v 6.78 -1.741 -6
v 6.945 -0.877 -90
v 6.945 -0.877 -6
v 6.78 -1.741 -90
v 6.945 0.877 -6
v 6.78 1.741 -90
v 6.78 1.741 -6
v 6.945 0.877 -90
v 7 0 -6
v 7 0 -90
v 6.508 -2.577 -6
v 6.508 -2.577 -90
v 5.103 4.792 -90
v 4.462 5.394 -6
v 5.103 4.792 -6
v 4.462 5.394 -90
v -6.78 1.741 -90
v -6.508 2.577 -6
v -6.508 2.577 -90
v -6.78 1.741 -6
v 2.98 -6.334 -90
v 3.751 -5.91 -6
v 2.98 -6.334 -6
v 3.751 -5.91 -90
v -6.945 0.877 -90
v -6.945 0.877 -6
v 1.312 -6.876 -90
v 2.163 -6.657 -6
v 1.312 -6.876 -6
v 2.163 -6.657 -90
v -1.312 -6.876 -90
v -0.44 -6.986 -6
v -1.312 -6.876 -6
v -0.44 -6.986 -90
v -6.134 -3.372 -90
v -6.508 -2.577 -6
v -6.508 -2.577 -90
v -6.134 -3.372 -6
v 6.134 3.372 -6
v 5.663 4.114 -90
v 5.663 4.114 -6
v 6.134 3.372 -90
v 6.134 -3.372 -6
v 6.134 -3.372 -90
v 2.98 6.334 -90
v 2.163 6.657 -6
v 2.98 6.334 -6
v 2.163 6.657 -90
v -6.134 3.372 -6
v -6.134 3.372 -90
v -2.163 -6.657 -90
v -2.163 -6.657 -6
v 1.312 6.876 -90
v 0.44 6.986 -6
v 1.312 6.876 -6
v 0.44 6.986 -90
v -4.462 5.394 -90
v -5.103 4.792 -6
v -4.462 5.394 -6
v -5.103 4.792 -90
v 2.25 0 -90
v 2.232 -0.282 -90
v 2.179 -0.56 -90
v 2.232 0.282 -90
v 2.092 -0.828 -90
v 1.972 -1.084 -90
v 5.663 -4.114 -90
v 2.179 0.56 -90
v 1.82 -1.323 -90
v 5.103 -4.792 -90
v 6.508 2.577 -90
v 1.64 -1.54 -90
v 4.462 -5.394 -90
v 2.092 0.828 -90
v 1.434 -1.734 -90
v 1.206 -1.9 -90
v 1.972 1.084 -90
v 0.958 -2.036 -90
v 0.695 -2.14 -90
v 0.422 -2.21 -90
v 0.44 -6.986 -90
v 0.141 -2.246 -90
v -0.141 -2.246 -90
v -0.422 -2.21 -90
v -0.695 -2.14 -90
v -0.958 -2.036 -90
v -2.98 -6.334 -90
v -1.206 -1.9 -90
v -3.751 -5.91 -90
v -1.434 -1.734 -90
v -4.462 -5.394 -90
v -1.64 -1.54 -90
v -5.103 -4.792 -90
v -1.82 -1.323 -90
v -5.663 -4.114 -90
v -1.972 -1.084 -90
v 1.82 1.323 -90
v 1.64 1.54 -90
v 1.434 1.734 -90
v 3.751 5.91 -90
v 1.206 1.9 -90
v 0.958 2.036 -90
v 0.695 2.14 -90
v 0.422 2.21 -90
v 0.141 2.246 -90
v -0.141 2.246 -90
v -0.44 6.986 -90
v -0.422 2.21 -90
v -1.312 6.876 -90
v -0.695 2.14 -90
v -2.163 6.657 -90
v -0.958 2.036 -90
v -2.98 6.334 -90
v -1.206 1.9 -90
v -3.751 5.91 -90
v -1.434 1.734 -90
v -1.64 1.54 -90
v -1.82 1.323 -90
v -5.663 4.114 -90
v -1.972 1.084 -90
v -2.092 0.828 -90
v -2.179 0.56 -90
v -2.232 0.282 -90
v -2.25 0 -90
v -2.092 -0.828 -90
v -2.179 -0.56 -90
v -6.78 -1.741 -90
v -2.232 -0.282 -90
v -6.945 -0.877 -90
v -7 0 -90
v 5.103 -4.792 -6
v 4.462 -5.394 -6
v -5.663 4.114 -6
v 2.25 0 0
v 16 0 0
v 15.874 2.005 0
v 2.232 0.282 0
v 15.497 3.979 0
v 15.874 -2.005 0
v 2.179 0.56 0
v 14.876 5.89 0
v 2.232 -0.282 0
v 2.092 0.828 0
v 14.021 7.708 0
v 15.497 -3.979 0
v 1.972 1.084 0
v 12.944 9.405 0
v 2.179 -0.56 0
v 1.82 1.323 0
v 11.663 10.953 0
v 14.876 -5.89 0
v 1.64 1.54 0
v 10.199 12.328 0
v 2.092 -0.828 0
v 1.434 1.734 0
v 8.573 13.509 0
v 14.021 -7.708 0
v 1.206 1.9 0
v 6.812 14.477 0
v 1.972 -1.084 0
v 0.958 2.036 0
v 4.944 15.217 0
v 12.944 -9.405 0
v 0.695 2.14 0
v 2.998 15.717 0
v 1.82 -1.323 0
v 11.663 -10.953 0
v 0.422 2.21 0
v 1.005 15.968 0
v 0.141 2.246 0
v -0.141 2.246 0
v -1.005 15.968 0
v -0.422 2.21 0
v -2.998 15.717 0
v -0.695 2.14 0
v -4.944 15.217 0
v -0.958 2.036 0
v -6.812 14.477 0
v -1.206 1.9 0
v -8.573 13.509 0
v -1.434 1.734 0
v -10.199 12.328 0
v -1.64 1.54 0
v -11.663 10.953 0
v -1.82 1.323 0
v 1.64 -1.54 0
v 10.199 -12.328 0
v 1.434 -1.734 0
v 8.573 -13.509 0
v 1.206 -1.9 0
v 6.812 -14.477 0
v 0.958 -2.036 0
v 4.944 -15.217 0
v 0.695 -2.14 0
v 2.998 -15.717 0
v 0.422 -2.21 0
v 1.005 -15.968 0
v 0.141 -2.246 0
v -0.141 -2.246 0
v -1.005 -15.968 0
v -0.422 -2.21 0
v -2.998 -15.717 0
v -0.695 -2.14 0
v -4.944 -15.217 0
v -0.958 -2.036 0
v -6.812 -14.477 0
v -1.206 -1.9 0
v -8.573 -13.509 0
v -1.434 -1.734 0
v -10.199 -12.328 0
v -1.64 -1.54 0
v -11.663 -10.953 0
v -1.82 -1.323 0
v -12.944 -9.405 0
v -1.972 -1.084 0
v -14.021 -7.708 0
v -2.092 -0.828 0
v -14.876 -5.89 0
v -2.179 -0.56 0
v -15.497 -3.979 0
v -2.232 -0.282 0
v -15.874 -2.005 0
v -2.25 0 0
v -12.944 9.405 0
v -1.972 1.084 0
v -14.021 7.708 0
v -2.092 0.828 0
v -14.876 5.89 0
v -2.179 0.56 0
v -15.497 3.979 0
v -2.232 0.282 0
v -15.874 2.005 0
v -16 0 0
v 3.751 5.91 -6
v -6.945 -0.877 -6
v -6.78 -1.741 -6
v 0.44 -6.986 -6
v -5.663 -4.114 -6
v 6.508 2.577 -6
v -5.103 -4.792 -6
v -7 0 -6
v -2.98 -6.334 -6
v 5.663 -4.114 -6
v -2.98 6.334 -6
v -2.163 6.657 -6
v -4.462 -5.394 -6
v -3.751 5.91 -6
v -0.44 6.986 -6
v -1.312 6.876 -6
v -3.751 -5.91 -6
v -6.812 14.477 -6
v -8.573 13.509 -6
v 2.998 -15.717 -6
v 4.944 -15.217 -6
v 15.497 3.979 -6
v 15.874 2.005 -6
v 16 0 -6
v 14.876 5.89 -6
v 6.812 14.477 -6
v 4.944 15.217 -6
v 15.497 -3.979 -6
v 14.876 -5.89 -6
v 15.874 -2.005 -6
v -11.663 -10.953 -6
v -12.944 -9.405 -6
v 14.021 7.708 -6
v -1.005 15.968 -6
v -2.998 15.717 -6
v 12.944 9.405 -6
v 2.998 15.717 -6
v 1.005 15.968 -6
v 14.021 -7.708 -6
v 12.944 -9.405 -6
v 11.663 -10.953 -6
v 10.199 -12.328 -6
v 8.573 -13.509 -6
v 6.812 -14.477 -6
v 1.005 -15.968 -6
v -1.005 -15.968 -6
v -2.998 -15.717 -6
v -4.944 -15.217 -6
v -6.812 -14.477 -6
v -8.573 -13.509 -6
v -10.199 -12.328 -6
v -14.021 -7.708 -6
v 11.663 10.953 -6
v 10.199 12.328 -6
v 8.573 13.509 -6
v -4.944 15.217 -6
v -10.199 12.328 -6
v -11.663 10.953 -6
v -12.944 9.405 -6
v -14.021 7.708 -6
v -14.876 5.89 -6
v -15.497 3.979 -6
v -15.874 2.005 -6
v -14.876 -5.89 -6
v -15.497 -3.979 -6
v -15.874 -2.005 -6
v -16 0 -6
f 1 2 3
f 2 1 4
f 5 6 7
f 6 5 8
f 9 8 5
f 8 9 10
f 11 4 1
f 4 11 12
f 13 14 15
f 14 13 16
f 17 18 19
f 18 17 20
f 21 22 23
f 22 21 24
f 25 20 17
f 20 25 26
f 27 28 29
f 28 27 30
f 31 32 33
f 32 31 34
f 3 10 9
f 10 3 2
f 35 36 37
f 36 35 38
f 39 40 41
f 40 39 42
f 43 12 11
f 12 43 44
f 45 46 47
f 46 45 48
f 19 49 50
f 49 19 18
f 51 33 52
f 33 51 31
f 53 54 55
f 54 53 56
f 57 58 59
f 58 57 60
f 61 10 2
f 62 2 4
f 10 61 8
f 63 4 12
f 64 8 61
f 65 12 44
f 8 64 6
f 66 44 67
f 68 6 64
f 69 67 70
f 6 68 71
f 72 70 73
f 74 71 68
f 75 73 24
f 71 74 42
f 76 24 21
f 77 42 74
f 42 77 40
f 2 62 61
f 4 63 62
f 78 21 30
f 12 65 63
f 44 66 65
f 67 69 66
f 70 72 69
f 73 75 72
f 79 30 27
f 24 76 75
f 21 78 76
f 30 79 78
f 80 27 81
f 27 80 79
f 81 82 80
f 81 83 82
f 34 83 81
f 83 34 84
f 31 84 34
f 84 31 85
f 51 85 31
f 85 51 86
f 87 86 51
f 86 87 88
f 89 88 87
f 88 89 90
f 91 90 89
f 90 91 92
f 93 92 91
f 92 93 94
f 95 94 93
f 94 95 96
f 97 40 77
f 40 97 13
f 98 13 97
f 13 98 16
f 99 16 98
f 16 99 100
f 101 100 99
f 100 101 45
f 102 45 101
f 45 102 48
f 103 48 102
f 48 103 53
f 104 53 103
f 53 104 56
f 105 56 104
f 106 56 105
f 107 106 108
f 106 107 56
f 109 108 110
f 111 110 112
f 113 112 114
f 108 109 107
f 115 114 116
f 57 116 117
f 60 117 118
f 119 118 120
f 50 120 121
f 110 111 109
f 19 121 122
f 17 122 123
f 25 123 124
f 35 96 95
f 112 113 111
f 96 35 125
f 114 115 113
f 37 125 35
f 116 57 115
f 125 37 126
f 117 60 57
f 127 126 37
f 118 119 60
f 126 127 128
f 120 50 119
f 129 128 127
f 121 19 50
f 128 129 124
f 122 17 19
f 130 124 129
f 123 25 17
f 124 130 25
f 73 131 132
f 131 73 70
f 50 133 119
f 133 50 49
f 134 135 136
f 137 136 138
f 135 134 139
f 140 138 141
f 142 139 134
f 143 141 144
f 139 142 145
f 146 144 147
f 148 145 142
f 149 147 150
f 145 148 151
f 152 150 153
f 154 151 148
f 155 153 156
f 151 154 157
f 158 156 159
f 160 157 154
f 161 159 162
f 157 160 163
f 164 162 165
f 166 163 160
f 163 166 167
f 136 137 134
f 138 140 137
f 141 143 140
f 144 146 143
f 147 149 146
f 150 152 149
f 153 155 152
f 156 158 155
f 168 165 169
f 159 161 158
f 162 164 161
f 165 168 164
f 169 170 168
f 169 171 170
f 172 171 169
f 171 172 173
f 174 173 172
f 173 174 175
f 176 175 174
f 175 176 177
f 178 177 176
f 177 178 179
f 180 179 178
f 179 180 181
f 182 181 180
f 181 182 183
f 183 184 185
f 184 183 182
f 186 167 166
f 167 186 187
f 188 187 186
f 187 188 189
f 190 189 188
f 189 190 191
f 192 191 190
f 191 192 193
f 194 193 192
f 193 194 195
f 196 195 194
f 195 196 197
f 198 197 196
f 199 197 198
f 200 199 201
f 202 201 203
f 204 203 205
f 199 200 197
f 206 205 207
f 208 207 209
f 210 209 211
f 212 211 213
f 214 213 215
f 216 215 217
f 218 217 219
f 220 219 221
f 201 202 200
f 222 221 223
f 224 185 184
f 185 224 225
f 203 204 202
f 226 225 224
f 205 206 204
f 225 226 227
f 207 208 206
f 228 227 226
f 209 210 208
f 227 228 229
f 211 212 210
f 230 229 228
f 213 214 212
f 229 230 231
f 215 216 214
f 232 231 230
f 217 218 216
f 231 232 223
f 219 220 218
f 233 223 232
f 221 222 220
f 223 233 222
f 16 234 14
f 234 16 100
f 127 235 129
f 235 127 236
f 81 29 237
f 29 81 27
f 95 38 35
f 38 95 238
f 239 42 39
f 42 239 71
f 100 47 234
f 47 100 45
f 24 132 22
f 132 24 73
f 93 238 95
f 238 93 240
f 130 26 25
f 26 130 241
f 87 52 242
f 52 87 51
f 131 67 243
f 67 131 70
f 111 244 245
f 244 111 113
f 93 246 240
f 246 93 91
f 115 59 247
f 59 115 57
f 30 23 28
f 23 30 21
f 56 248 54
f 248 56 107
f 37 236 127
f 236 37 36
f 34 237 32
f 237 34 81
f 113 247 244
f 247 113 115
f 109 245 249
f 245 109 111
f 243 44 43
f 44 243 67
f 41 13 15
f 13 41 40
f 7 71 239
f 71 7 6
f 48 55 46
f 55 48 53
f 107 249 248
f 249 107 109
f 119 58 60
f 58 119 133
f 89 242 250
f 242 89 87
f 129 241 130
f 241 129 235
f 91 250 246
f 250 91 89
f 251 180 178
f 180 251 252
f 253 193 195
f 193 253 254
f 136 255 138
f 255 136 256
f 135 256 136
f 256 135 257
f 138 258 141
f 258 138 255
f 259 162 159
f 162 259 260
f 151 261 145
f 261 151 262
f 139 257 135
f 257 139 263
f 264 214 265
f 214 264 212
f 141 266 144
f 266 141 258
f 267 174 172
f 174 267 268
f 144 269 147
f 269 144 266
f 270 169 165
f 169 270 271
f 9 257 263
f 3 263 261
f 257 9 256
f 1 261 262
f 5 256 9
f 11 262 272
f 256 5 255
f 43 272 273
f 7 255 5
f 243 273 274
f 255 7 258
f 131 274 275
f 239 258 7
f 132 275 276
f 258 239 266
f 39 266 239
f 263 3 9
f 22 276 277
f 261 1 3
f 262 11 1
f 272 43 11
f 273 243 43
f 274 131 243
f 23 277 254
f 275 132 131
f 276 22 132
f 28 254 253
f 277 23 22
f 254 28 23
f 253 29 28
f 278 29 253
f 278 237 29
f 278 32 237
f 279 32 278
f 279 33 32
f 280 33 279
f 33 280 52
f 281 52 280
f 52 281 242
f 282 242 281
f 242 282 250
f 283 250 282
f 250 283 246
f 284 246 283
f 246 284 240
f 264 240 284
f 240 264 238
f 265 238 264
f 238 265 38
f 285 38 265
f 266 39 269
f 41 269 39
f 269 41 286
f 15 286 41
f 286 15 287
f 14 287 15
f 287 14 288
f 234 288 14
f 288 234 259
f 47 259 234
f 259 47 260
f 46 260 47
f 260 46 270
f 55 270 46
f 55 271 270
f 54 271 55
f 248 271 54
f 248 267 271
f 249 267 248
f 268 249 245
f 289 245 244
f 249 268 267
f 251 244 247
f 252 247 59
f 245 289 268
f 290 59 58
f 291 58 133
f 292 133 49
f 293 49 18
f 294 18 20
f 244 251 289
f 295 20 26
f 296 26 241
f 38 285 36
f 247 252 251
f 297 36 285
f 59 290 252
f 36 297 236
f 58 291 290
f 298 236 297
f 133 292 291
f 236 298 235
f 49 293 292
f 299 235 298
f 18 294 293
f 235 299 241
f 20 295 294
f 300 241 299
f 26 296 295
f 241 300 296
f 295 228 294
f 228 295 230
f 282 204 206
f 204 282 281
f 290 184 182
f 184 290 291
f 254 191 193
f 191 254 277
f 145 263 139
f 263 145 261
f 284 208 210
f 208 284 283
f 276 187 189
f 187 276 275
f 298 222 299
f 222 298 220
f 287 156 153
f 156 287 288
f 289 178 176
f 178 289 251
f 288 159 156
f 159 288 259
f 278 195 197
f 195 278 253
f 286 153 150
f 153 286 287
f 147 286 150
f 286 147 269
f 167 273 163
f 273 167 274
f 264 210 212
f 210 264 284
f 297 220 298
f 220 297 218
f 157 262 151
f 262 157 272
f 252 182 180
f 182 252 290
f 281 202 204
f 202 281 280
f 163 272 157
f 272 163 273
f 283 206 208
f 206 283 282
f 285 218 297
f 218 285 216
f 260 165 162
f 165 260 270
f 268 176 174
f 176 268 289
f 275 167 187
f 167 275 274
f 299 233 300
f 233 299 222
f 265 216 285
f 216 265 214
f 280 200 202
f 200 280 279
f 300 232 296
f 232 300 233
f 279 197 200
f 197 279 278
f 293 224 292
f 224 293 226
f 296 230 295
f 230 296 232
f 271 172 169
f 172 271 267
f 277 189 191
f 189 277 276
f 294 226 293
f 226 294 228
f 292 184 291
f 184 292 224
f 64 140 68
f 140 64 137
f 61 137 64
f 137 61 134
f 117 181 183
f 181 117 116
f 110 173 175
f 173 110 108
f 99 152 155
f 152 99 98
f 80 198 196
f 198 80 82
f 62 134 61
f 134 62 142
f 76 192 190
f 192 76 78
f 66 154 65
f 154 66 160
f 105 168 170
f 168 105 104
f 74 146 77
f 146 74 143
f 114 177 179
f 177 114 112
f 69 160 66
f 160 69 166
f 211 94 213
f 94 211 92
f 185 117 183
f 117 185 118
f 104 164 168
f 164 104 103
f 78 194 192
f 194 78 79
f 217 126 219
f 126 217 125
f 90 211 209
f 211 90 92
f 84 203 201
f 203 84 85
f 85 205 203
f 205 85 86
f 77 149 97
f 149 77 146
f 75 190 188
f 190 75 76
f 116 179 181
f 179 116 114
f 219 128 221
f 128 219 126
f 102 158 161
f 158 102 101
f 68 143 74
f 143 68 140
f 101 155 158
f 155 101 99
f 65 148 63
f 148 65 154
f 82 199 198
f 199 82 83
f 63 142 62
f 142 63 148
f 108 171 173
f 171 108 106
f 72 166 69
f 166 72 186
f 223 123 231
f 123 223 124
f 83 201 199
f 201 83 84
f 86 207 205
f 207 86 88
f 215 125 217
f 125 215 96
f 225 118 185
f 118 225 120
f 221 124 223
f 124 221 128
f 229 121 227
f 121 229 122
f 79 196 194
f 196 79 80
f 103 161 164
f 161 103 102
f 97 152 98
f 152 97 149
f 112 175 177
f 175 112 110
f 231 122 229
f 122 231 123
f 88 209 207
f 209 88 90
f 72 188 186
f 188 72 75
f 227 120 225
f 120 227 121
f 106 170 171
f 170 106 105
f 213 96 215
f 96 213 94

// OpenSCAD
$fn = 50;


difference() {
	union() {
		translate(v = [0, 0, -90.0000000000]) {
			cylinder(h = 90, r = 7.0000000000);
		}
		translate(v = [0, 0, -6.0000000000]) {
			cylinder(h = 6, r = 16.0000000000);
		}
	}
	union() {
		#translate(v = [0, 0, -90]) {
			cylinder(h = 90, r = 2.2500000000);
		}
	}
}
